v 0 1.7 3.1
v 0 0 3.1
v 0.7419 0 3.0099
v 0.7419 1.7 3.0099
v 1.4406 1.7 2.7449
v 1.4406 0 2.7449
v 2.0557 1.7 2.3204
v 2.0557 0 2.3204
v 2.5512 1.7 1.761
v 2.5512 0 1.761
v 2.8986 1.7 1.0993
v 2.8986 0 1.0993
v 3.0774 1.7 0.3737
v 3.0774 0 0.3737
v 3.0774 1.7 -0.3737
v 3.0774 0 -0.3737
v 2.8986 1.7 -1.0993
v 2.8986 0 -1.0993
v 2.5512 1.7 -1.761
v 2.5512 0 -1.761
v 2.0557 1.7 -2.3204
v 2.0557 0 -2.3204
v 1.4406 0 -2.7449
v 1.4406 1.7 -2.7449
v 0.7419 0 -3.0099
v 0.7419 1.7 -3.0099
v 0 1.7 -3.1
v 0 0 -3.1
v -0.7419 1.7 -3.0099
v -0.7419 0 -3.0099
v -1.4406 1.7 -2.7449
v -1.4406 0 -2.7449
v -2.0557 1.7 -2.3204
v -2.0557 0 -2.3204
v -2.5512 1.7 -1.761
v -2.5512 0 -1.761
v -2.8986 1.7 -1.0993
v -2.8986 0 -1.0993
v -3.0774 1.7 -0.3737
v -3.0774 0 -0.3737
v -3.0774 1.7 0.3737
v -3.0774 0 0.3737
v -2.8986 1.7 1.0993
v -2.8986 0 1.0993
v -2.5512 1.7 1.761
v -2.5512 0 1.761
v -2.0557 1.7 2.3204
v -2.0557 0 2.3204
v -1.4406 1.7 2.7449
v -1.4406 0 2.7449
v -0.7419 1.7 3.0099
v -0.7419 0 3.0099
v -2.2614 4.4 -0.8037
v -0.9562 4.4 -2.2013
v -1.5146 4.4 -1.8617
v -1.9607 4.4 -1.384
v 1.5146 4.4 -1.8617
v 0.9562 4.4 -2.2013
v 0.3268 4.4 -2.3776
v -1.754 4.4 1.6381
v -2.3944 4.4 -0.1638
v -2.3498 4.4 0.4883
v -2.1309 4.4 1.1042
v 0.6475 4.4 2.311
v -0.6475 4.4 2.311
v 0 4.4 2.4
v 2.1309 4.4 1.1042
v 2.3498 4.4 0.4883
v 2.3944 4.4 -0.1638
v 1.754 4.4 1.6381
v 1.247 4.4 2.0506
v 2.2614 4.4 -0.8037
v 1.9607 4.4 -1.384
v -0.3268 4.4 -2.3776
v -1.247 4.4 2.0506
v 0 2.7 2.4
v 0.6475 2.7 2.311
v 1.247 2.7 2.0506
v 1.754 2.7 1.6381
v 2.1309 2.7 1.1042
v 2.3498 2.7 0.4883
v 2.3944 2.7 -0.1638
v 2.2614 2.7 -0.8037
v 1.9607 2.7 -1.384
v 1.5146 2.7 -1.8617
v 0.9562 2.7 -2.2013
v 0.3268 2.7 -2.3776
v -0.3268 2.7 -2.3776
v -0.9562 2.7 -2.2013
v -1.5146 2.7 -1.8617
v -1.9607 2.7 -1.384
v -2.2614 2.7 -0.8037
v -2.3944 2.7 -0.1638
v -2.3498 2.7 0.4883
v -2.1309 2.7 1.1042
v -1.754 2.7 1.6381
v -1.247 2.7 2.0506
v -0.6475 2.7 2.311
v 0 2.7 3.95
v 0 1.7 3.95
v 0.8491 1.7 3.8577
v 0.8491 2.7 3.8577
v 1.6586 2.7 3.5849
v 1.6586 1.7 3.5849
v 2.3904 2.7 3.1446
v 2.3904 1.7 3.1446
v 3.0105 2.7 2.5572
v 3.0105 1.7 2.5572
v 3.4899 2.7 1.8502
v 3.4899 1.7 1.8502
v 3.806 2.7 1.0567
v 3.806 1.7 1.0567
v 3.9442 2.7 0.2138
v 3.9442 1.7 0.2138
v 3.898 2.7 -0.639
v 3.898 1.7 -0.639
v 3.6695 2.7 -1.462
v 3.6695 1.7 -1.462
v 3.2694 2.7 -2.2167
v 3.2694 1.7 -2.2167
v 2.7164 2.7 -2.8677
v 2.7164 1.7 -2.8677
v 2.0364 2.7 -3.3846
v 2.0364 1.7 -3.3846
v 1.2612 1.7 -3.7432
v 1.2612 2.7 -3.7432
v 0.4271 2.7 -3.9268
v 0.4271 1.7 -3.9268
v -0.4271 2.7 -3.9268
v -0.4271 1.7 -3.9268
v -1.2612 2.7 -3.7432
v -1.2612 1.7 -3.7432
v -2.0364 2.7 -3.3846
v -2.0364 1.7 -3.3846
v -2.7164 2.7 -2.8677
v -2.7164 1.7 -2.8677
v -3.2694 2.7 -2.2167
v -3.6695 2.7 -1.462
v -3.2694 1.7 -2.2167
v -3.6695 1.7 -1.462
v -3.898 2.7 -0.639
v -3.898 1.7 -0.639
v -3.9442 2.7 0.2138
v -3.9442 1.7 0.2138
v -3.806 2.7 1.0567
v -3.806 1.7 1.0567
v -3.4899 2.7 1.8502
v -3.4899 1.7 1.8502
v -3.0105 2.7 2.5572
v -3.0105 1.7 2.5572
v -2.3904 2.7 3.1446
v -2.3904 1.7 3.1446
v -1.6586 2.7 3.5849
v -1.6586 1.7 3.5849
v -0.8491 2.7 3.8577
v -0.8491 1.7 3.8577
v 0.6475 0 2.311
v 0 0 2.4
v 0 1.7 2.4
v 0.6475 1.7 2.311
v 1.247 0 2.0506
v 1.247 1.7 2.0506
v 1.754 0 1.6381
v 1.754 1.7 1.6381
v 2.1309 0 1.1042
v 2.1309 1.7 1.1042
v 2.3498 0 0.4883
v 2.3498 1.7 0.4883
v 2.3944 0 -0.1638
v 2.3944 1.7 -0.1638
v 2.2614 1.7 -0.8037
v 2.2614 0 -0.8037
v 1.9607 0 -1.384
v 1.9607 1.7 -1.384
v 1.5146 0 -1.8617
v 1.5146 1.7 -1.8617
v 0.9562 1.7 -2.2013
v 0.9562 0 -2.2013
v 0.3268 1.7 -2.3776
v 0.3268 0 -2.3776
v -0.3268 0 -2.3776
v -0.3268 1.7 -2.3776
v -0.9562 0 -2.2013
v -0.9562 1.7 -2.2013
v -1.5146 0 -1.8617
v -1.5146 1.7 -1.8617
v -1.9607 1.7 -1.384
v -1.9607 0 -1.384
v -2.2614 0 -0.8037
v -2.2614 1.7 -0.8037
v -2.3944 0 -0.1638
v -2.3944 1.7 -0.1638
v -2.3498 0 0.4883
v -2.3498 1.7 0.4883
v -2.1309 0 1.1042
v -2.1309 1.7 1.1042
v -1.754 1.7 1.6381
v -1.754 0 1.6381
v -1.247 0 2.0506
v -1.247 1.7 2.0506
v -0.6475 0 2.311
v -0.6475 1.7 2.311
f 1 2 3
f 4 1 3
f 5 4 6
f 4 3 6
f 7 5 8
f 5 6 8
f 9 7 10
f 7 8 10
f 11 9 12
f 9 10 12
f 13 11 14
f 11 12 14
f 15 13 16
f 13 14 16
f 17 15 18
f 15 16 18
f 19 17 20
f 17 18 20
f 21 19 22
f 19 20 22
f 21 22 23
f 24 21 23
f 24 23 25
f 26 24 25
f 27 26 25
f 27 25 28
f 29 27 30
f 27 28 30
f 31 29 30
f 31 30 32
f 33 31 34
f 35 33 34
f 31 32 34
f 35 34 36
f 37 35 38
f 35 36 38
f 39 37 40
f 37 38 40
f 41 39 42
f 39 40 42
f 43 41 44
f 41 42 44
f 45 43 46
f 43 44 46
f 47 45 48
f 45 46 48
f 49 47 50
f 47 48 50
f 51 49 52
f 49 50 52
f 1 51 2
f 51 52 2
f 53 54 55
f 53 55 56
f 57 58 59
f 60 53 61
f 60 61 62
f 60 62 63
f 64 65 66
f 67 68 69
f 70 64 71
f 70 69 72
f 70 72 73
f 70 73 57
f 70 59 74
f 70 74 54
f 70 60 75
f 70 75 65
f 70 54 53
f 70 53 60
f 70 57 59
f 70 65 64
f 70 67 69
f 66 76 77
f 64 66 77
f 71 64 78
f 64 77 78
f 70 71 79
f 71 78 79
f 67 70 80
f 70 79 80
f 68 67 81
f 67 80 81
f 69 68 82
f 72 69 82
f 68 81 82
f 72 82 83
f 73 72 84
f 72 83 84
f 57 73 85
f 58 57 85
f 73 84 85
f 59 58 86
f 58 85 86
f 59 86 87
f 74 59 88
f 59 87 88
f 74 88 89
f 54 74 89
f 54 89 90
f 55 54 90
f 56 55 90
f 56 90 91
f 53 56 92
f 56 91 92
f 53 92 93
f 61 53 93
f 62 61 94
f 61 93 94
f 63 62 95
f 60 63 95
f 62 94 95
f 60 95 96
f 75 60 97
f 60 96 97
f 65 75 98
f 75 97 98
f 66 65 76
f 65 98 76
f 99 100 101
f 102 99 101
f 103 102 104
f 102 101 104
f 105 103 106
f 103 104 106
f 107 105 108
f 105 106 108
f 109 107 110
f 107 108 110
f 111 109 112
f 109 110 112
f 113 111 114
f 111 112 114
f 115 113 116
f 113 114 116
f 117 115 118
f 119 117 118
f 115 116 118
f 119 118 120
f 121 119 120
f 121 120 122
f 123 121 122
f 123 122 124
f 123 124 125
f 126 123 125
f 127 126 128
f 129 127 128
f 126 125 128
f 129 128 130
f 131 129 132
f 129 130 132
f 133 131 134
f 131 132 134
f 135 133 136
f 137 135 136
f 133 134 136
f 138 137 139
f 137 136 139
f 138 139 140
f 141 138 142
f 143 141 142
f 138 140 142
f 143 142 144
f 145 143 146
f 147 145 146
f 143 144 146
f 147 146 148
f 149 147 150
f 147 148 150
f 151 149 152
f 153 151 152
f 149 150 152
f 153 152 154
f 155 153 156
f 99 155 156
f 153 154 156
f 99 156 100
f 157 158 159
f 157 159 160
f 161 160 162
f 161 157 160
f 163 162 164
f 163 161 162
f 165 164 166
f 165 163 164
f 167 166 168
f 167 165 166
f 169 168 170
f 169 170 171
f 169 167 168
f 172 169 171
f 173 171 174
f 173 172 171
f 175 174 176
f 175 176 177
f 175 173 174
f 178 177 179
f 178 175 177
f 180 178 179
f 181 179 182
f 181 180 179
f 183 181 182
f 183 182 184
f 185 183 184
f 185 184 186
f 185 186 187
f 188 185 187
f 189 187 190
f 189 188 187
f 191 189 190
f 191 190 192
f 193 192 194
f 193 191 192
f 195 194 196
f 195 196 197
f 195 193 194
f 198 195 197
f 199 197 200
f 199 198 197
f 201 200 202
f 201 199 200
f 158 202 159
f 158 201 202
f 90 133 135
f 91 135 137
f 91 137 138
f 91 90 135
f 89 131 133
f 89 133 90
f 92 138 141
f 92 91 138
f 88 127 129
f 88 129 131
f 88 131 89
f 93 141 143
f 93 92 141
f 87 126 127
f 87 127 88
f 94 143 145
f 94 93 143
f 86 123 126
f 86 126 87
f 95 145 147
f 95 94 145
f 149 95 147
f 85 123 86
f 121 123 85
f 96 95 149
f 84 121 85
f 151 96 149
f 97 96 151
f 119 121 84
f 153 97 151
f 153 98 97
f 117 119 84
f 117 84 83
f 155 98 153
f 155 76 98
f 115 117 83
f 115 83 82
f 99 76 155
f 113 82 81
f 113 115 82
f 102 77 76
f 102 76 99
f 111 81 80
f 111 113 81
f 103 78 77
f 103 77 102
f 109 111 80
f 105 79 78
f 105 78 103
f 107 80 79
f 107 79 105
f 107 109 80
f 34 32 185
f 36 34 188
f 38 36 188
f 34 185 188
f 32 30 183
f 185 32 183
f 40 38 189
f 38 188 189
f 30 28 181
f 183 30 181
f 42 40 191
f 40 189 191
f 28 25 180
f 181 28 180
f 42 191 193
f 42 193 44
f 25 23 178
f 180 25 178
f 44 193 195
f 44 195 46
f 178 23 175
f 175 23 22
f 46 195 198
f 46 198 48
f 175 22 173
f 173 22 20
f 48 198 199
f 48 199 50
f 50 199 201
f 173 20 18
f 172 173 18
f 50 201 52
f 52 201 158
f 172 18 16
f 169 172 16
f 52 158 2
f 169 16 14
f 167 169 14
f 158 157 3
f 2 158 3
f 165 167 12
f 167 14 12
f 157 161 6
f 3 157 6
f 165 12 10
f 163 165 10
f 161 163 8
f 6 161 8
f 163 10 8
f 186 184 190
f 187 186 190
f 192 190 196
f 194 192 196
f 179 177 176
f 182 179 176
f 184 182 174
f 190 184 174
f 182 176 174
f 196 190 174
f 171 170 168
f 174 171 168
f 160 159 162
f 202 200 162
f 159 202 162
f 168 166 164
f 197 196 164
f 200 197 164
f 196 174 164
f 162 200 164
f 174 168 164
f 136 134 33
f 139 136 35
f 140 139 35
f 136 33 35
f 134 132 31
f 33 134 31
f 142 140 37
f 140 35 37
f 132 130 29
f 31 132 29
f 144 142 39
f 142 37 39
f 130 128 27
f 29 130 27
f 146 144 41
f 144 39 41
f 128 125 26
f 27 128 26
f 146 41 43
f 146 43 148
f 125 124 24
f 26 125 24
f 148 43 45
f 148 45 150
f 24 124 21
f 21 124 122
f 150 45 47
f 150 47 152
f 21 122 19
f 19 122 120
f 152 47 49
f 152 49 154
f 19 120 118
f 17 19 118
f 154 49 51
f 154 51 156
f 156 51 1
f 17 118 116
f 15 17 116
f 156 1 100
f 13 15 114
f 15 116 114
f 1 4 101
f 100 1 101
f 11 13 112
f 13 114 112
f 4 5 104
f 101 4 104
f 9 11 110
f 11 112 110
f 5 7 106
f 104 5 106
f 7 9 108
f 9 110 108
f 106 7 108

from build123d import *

# Parameters (mm, degrees)
SKETCH1_R           = 3.1
SKETCH1_R_2         = 2.4
BOSS_EXTRUDE1_DEPTH = 1.7
SKETCH2_R           = 3.95
BOSS_EXTRUDE2_DEPTH = 1
SKETCH3_R           = 2.4
BOSS_EXTRUDE3_DEPTH = 1.7


with BuildPart() as part:
    # Sketch1 → Boss-Extrude1 (new body)
    with BuildSketch(Plane(origin=(0, 0, 0), x_dir=(1, 0, 0), z_dir=(0, 1, 0))):
        with Locations(Location((0, 0, 0), (0, 0, 270))):
            Circle(SKETCH1_R)
        with Locations(Location((0, 0, 0), (0, 0, 270))):
            Circle(SKETCH1_R_2, mode=Mode.SUBTRACT)
    extrude(amount=BOSS_EXTRUDE1_DEPTH)

    # Sketch2 → Boss-Extrude2 (add)
    with BuildSketch(Plane(origin=(0, 1.7, 0), x_dir=(1, 0, 0), z_dir=(0, 1, 0))):
        with Locations(Location((0, 0, 0), (0, 0, 270))):
            Circle(SKETCH2_R)
    extrude(amount=BOSS_EXTRUDE2_DEPTH)

    # Sketch3 → Boss-Extrude3 (add)
    with BuildSketch(Plane(origin=(0, 2.7, 0), x_dir=(1, 0, 0), z_dir=(0, 1, 0))):
        with Locations(Location((0, 0, 0), (0, 0, 270))):
            Circle(SKETCH3_R)
    extrude(amount=BOSS_EXTRUDE3_DEPTH)


solid = part.part
